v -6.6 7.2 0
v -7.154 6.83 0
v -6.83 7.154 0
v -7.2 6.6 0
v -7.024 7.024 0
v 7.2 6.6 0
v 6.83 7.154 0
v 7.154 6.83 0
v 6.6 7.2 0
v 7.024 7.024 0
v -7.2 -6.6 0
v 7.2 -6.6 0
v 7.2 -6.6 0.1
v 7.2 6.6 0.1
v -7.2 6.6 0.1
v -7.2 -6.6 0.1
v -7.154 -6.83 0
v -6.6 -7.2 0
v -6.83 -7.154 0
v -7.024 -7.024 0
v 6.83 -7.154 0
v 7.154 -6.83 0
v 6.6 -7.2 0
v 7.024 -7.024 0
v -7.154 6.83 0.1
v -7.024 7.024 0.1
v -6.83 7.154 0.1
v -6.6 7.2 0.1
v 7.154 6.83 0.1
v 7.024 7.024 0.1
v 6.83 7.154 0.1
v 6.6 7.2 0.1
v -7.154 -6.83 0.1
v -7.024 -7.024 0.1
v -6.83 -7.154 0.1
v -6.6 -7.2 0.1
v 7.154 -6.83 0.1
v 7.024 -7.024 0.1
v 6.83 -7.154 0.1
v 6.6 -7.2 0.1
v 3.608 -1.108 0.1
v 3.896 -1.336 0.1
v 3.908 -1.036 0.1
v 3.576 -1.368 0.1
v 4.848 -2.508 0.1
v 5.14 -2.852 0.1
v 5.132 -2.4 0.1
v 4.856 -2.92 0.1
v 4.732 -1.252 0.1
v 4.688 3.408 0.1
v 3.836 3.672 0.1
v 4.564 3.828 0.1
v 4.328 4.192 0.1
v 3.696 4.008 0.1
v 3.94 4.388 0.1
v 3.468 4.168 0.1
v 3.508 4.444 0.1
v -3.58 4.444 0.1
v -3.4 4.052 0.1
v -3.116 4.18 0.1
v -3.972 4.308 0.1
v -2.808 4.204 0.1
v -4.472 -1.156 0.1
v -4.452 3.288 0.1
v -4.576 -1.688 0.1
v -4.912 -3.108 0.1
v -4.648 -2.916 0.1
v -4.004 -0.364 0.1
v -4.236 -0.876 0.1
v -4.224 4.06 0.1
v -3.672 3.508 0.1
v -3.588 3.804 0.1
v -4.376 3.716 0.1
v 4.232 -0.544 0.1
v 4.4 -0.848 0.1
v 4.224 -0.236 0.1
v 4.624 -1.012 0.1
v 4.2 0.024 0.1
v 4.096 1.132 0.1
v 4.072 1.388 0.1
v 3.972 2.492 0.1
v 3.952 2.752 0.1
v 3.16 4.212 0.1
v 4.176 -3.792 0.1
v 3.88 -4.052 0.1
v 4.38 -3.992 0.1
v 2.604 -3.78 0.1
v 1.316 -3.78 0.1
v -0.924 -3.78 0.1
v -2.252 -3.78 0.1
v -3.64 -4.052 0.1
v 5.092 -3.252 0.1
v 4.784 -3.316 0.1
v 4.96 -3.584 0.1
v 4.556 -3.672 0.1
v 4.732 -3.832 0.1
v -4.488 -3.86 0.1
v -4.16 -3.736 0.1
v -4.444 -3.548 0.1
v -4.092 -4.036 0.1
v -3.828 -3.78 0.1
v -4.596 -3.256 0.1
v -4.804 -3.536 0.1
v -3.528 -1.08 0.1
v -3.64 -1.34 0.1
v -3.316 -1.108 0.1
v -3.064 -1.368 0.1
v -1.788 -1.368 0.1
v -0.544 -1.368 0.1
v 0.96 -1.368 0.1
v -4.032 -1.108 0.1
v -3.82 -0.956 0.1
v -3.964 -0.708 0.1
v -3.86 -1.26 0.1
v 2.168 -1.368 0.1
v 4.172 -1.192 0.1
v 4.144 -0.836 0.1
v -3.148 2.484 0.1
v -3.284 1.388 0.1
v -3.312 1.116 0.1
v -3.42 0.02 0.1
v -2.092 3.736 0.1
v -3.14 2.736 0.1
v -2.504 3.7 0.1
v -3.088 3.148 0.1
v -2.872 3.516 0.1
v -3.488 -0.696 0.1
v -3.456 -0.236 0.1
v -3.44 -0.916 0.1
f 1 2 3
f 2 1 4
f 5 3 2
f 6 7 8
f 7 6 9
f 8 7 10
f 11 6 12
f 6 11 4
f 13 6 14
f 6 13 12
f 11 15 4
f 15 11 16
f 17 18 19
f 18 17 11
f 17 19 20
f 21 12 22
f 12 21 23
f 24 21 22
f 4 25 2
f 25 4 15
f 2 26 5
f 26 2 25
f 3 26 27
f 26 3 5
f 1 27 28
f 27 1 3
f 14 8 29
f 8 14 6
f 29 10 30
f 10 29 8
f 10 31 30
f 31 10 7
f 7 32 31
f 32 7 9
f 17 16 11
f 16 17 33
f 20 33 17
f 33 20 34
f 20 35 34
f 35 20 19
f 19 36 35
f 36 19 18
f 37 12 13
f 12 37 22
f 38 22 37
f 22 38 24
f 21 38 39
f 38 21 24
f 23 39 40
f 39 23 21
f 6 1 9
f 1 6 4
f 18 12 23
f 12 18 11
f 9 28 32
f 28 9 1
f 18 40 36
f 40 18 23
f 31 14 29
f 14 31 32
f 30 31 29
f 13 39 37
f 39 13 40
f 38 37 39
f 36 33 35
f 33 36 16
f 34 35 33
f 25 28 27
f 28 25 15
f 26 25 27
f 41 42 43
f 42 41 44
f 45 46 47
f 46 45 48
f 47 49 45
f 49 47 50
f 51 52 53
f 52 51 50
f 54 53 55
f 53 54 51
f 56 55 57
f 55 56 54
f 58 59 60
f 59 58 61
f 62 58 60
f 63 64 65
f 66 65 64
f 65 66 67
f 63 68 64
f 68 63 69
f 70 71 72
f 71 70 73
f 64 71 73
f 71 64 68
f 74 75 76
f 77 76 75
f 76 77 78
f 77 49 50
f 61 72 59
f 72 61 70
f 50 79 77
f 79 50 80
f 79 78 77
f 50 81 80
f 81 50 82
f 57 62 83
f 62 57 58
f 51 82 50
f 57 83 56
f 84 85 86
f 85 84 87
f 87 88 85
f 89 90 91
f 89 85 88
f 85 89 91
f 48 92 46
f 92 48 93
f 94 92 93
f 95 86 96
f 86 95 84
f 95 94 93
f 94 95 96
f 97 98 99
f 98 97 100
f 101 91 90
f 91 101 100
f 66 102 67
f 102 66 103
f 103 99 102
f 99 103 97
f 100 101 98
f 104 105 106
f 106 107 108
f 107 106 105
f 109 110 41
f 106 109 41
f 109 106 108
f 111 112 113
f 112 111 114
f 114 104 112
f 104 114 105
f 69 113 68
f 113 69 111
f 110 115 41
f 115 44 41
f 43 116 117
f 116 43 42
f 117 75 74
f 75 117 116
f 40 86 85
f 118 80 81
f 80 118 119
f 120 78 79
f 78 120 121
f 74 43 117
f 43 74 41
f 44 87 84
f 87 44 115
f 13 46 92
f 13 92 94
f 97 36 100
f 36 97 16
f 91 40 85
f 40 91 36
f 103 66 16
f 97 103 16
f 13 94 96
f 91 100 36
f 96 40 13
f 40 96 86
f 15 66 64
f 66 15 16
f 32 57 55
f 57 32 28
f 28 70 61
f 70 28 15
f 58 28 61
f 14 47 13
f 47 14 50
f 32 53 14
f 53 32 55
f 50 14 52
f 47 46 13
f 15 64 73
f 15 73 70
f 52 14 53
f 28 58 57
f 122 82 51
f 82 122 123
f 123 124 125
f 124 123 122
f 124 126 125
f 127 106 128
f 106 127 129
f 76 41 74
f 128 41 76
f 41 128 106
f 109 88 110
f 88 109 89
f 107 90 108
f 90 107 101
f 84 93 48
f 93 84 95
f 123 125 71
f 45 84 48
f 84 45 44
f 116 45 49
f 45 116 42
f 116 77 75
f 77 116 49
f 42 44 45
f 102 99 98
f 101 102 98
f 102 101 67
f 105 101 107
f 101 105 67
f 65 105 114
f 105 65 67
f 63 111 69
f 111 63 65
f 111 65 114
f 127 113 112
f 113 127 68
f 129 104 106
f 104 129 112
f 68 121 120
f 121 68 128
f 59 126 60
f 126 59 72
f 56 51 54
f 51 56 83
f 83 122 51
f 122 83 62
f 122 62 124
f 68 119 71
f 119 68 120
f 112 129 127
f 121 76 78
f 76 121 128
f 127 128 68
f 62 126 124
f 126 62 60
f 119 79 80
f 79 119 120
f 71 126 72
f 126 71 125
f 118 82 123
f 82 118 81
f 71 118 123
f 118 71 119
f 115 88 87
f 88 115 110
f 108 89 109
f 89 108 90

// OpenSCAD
// file: ../p/box3u12.scad
use <../lib.scad>
function ldraw_lib__box3u12() = [
// 0 Box with 3 Parallel Faces without Any Edges
// 0 Name: box3u12.dat
// 0 Author: J.C. Tchang [tchang]
// 0 !LDRAW_ORG Primitive UPDATE 2014-02
// 0 !LICENSE Licensed under CC BY 4.0 : see CAreadme.txt
// 
// 0 BFC CERTIFY CCW
  [0,"BFC","CERTIFY"],
  [0,"BFC","CCW"],
// 
// 0 !HISTORY 2014-12-23 [PTadmin] Official Update 2014-02
// 
// 
// 4 16 -1 1 1 1 1 1 1 1 -1 -1 1 -1
  [4,16,-1,1,1,1,1,1,1,1,-1,-1,1,-1],
// 4 16 -1 1 1 -1 0 1 1 0 1 1 1 1
  [4,16,-1,1,1,-1,0,1,1,0,1,1,1,1],
// 4 16 1 1 -1 1 0 -1 -1 0 -1 -1 1 -1
  [4,16,1,1,-1,1,0,-1,-1,0,-1,-1,1,-1],
];
module ldraw_lib__box3u12(step=0, col=false, unit=2/5, alt=false, line=0.2, solid=!$preview)
    makepoly(ldraw_lib__box3u12(), step=step, col=col, unit=unit, alt=alt, line=line, solid=solid);
ldraw_lib__box3u12(line=0.2);
// file: ../p/1-4cyli.scad
use <../lib.scad>
function ldraw_lib__1_4cyli() = [
// 0 Cylinder 0.25
// 0 Name: 1-4cyli.dat
// 0 Author: James Jessiman
// 0 !LDRAW_ORG Primitive UPDATE 2012-01
// 0 !LICENSE Licensed under CC BY 4.0 : see CAreadme.txt
// 
// 0 BFC CERTIFY CCW
  [0,"BFC","CERTIFY"],
  [0,"BFC","CCW"],
// 
// 0 !HISTORY 2002-03-23 [sbliss] Added BFC statement.
// 0 !HISTORY 2002-04-25 [PTadmin] Official Update 2002-02
// 0 !HISTORY 2007-06-22 [PTadmin] Header formatted for Contributor Agreement
// 0 !HISTORY 2008-07-01 [PTadmin] Official Update 2008-01
// 0 !HISTORY 2012-02-16 [Philo] Changed to CCW
// 0 !HISTORY 2012-03-30 [PTadmin] Official Update 2012-01
// 
// 
// 4 16 1 1 0 0.9239 1 0.3827 0.9239 0 0.3827 1 0 0
  [4,16,1,1,0,0.9239,1,0.3827,0.9239,0,0.3827,1,0,0],
// 5 24 1 0 0 1 1 0 0.9239 0 0.3827 1 0 -1
  [5,24,1,0,0,1,1,0,0.9239,0,0.3827,1,0,-1],
// 4 16 0.9239 1 0.3827 0.7071 1 0.7071 0.7071 0 0.7071 0.9239 0 0.3827
  [4,16,0.9239,1,0.3827,0.7071,1,0.7071,0.7071,0,0.7071,0.9239,0,0.3827],
// 5 24 0.9239 0 0.3827 0.9239 1 0.3827 0.7071 0 0.7071 1 0 0
  [5,24,0.9239,0,0.3827,0.9239,1,0.3827,0.7071,0,0.7071,1,0,0],
// 4 16 0.7071 1 0.7071 0.3827 1 0.9239 0.3827 0 0.9239 0.7071 0 0.7071
  [4,16,0.7071,1,0.7071,0.3827,1,0.9239,0.3827,0,0.9239,0.7071,0,0.7071],
// 5 24 0.7071 0 0.7071 0.7071 1 0.7071 0.3827 0 0.9239 0.9239 0 0.3827
  [5,24,0.7071,0,0.7071,0.7071,1,0.7071,0.3827,0,0.9239,0.9239,0,0.3827],
// 4 16 0.3827 1 0.9239 0 1 1 0 0 1 0.3827 0 0.9239
  [4,16,0.3827,1,0.9239,0,1,1,0,0,1,0.3827,0,0.9239],
// 5 24 0.3827 0 0.9239 0.3827 1 0.9239 0 0 1 0.7071 0 0.7071
  [5,24,0.3827,0,0.9239,0.3827,1,0.9239,0,0,1,0.7071,0,0.7071],
// 5 24 0 0 1 0 1 1 0.3827 0 0.9239 -1 0 1
  [5,24,0,0,1,0,1,1,0.3827,0,0.9239,-1,0,1],
];
module ldraw_lib__1_4cyli(step=0, col=false, unit=2/5, alt=false, line=0.2, solid=!$preview)
    makepoly(ldraw_lib__1_4cyli(), step=step, col=col, unit=unit, alt=alt, line=line, solid=solid);
ldraw_lib__1_4cyli(line=0.2);
// file: s/stickerback018x018.scad
use <../../lib.scad>
use <../../p/1-4chrd.scad>
use <../../p/1-4cyli.scad>
use <../../p/box3u12.scad>
function ldraw_lib__s__stickerback018x018() = [
// 0 ~Sticker Back  1.8 x  1.8
// 0 Name: s\stickerback018x018.dat
// 0 Author: Massimo Maso [Sirio]
// 0 !LDRAW_ORG Subpart UPDATE 2025-08
// 0 !LICENSE Licensed under CC BY 4.0 : see CAreadme.txt
// 
// 0 BFC CERTIFY CCW
  [0,"BFC","CERTIFY"],
  [0,"BFC","CCW"],
// 
// 0 !HISTORY 2025-08-31 [OrionP] Official Update 2025-08
// 
// 0 // Primitives
// 1 16 -16.5 0 16.5 -1.5 0 0 0 -1 0 0 0 1.5 1-4chrd.dat
  [1,16,-16.5,0,16.5,-1.5,0,0,0,-1,0,0,0,1.5, ldraw_lib__1_4chrd()],
// 1 16 16.5 0 16.5 1.5 0 0 0 -1 0 0 0 1.5 1-4chrd.dat
  [1,16,16.5,0,16.5,1.5,0,0,0,-1,0,0,0,1.5, ldraw_lib__1_4chrd()],
// 1 16 0 -.25 0 0 0 18 0 .25 0 16.5 0 0 box3u12.dat
  [1,16,0,-.25,0,0,0,18,0,.25,0,16.5,0,0, ldraw_lib__box3u12()],
// 1 16 -16.5 0 -16.5 -1.5 0 0 0 -1 0 0 0 -1.5 1-4chrd.dat
  [1,16,-16.5,0,-16.5,-1.5,0,0,0,-1,0,0,0,-1.5, ldraw_lib__1_4chrd()],
// 1 16 16.5 0 -16.5 1.5 0 0 0 -1 0 0 0 -1.5 1-4chrd.dat
  [1,16,16.5,0,-16.5,1.5,0,0,0,-1,0,0,0,-1.5, ldraw_lib__1_4chrd()],
// 1 16 -16.5 -.25 16.5 -1.5 0 0 0 .25 0 0 0 1.5 1-4cyli.dat
  [1,16,-16.5,-.25,16.5,-1.5,0,0,0,.25,0,0,0,1.5, ldraw_lib__1_4cyli()],
// 1 16 16.5 -.25 16.5 1.5 0 0 0 .25 0 0 0 1.5 1-4cyli.dat
  [1,16,16.5,-.25,16.5,1.5,0,0,0,.25,0,0,0,1.5, ldraw_lib__1_4cyli()],
// 1 16 -16.5 -.25 -16.5 -1.5 0 0 0 .25 0 0 0 -1.5 1-4cyli.dat
  [1,16,-16.5,-.25,-16.5,-1.5,0,0,0,.25,0,0,0,-1.5, ldraw_lib__1_4cyli()],
// 1 16 16.5 -.25 -16.5 1.5 0 0 0 .25 0 0 0 -1.5 1-4cyli.dat
  [1,16,16.5,-.25,-16.5,1.5,0,0,0,.25,0,0,0,-1.5, ldraw_lib__1_4cyli()],
// 0 // Bottom face
// 4 16 -16.5 0 18 16.5 0 18 18 0 16.5 -18 0 16.5
  [4,16,-16.5,0,18,16.5,0,18,18,0,16.5,-18,0,16.5],
// 4 16 -16.5 0 -18 -18 0 -16.5 18 0 -16.5 16.5 0 -18
  [4,16,-16.5,0,-18,-18,0,-16.5,18,0,-16.5,16.5,0,-18],
// 0 // Lateral face
// 4 16 -16.5 -.25 18 16.5 -.25 18 16.5 0 18 -16.5 0 18
  [4,16,-16.5,-.25,18,16.5,-.25,18,16.5,0,18,-16.5,0,18],
// 4 16 16.5 0 -18 16.5 -.25 -18 -16.5 -.25 -18 -16.5 0 -18
  [4,16,16.5,0,-18,16.5,-.25,-18,-16.5,-.25,-18,-16.5,0,-18],
];
module ldraw_lib__s__stickerback018x018(step=0, col=false, unit=2/5, alt=false, line=0.2, solid=!$preview)
    makepoly(ldraw_lib__s__stickerback018x018(), step=step, col=col, unit=unit, alt=alt, line=line, solid=solid);
ldraw_lib__s__stickerback018x018(line=0.2);
// file: ../p/1-4chrd.scad
use <../lib.scad>
function ldraw_lib__1_4chrd() = [
// 0 Chord 0.25
// 0 Name: 1-4chrd.dat
// 0 Author: Max Martin Richter [MMR1988]
// 0 !LDRAW_ORG Primitive UPDATE 2023-05
// 0 !LICENSE Licensed under CC BY 4.0 : see CAreadme.txt
// 
// 0 BFC CERTIFY CCW
  [0,"BFC","CERTIFY"],
  [0,"BFC","CCW"],
// 
// 0 !HISTORY 2004-04-22 [PTadmin] Official Update 2004-02
// 0 !HISTORY 2007-10-09 [PTadmin] Header formatted for Contributor Agreement
// 0 !HISTORY 2008-07-01 [PTadmin] Official Update 2008-01
// 0 !HISTORY 2012-08-02 [MMR1988] Re-creation with PrimGen2 and Rectifier
// 0 !HISTORY 2012-08-09 [PTadmin] Official Update 2012-02
// 0 !HISTORY 2023-10-27 [OrionP] Change author to MMR1988 from hafhead
// 0 !HISTORY 2023-10-31 [OrionP] Official Update 2023-05
// 
// 4 16 0.9239 0 0.3827 0.3827 0 0.9239 0 0 1 1 0 0
  [4,16,0.9239,0,0.3827,0.3827,0,0.9239,0,0,1,1,0,0],
// 3 16 0.7071 0 0.7071 0.3827 0 0.9239 0.9239 0 0.3827
  [3,16,0.7071,0,0.7071,0.3827,0,0.9239,0.9239,0,0.3827],
];
module ldraw_lib__1_4chrd(step=0, col=false, unit=2/5, alt=false, line=0.2, solid=!$preview)
    makepoly(ldraw_lib__1_4chrd(), step=step, col=col, unit=unit, alt=alt, line=line, solid=solid);
ldraw_lib__1_4chrd(line=0.2);
// main file
use <../lib.scad>
use <../p/1-4chrd.scad>
use <s/stickerback018x018.scad>
function ldraw_lib__6531941a() = [
// 0 Sticker  1.8 x  1.8 with Narrow Shuttle Bay
// 0 Name: 6531941a.dat
// 0 Author: Philippe Hurbain [Philo]
// 0 !LDRAW_ORG Part UPDATE 2026-07
// 0 !LICENSE Licensed under CC BY 4.0 : see CAreadme.txt
// 
// 0 BFC CERTIFY CCW
  [0,"BFC","CERTIFY"],
  [0,"BFC","CCW"],
// 
// 0 !CATEGORY Sticker
// 0 !KEYWORDS Bricklink 10356stk01a, Brickowl 985574, Rebrickable 10111843
// 0 !KEYWORDS Set 10356, Star Trek, U.S.S. Enterprise NCC-1701-D
// 
// 0 !HISTORY 2026-07-30 [OrionP] Official Update 2026-07
// 
// 1 16 0 0 0 1 0 0 0 1 0 0 0 1 s\stickerback018x018.dat
  [1,16,0,0,0,1,0,0,0,1,0,0,0,1, ldraw_lib__s__stickerback018x018()],
// 1 71 16.5 -.25 16.5 1.5 0 0 0 1 0 0 0 1.5 1-4chrd.dat
  [1,71,16.5,-.25,16.5,1.5,0,0,0,1,0,0,0,1.5, ldraw_lib__1_4chrd()],
// 1 71 16.5 -.25 -16.5 0 0 1.5 0 1 0 -1.5 0 0 1-4chrd.dat
  [1,71,16.5,-.25,-16.5,0,0,1.5,0,1,0,-1.5,0,0, ldraw_lib__1_4chrd()],
// 1 71 -16.5 -.25 -16.5 -1.5 0 0 0 1 0 0 0 -1.5 1-4chrd.dat
  [1,71,-16.5,-.25,-16.5,-1.5,0,0,0,1,0,0,0,-1.5, ldraw_lib__1_4chrd()],
// 1 71 -16.5 -.25 16.5 0 0 -1.5 0 1 0 1.5 0 0 1-4chrd.dat
  [1,71,-16.5,-.25,16.5,0,0,-1.5,0,1,0,1.5,0,0, ldraw_lib__1_4chrd()],
// 
// 4 0 8.94 -.25 -3.42 9.74 -.25 -3.34 9.77 -.25 -2.59 9.02 -.25 -2.77
  [4,0,8.94,-.25,-3.42,9.74,-.25,-3.34,9.77,-.25,-2.59,9.02,-.25,-2.77],
// 4 0 12.14 -.25 -7.3 12.85 -.25 -7.13 12.83 -.25 -6 12.12 -.25 -6.27
  [4,0,12.14,-.25,-7.3,12.85,-.25,-7.13,12.83,-.25,-6,12.12,-.25,-6.27],
// 4 0 12.12 -.25 -6.27 12.83 -.25 -6 11.72 -.25 8.52 11.83 -.25 -3.13
  [4,0,12.12,-.25,-6.27,12.83,-.25,-6,11.72,-.25,8.52,11.83,-.25,-3.13],
// 4 0 10.82 -.25 10.48 9.59 -.25 9.18 11.72 -.25 8.52 11.41 -.25 9.57
  [4,0,10.82,-.25,10.48,9.59,-.25,9.18,11.72,-.25,8.52,11.41,-.25,9.57],
// 4 0 9.59 -.25 9.18 10.82 -.25 10.48 9.85 -.25 10.97 9.24 -.25 10.02
  [4,0,9.59,-.25,9.18,10.82,-.25,10.48,9.85,-.25,10.97,9.24,-.25,10.02],
// 4 0 8.77 -.25 11.11 8.67 -.25 10.42 9.24 -.25 10.02 9.85 -.25 10.97
  [4,0,8.77,-.25,11.11,8.67,-.25,10.42,9.24,-.25,10.02,9.85,-.25,10.97],
// 4 0 -7.79 -.25 10.45 -8.95 -.25 11.11 -9.93 -.25 10.77 -8.5 -.25 10.13
  [4,0,-7.79,-.25,10.45,-8.95,-.25,11.11,-9.93,-.25,10.77,-8.5,-.25,10.13],
// 3 0 -7.02 -.25 10.51 -8.95 -.25 11.11 -7.79 -.25 10.45
  [3,0,-7.02,-.25,10.51,-8.95,-.25,11.11,-7.79,-.25,10.45],
// 3 0 -11.18 -.25 -2.89 -11.13 -.25 8.22 -11.44 -.25 -4.22
  [3,0,-11.18,-.25,-2.89,-11.13,-.25,8.22,-11.44,-.25,-4.22],
// 4 0 -11.13 -.25 8.22 -12.28 -.25 -7.77 -11.62 -.25 -7.29 -11.44 -.25 -4.22
  [4,0,-11.13,-.25,8.22,-12.28,-.25,-7.77,-11.62,-.25,-7.29,-11.44,-.25,-4.22],
// 4 0 -11.13 -.25 8.22 -11.18 -.25 -2.89 -10.59 -.25 -2.19 -10.01 -.25 -.91
  [4,0,-11.13,-.25,8.22,-11.18,-.25,-2.89,-10.59,-.25,-2.19,-10.01,-.25,-.91],
// 4 0 -10.94 -.25 9.29 -9.18 -.25 8.77 -8.97 -.25 9.51 -10.56 -.25 10.15
  [4,0,-10.94,-.25,9.29,-9.18,-.25,8.77,-8.97,-.25,9.51,-10.56,-.25,10.15],
// 4 0 -10.94 -.25 9.29 -11.13 -.25 8.22 -10.01 -.25 -.91 -9.18 -.25 8.77
  [4,0,-10.94,-.25,9.29,-11.13,-.25,8.22,-10.01,-.25,-.91,-9.18,-.25,8.77],
// 3 0 10.58 -.25 -1.36 11 -.25 -2.12 10.56 -.25 -.59
  [3,0,10.58,-.25,-1.36,11,-.25,-2.12,10.56,-.25,-.59],
// 4 0 10.5 -.25 .06 10.56 -.25 -.59 11 -.25 -2.12 11.56 -.25 -2.53
  [4,0,10.5,-.25,.06,10.56,-.25,-.59,11,-.25,-2.12,11.56,-.25,-2.53],
// 3 0 11.56 -.25 -2.53 11.83 -.25 -3.13 11.72 -.25 8.52
  [3,0,11.56,-.25,-2.53,11.83,-.25,-3.13,11.72,-.25,8.52],
// 4 0 -10.56 -.25 10.15 -8.97 -.25 9.51 -8.5 -.25 10.13 -9.93 -.25 10.77
  [4,0,-10.56,-.25,10.15,-8.97,-.25,9.51,-8.5,-.25,10.13,-9.93,-.25,10.77],
// 4 0 10.18 -.25 3.47 10.24 -.25 2.83 11.56 -.25 -2.53 11.72 -.25 8.52
  [4,0,10.18,-.25,3.47,10.24,-.25,2.83,11.56,-.25,-2.53,11.72,-.25,8.52],
// 3 0 10.24 -.25 2.83 10.5 -.25 .06 11.56 -.25 -2.53
  [3,0,10.24,-.25,2.83,10.5,-.25,.06,11.56,-.25,-2.53],
// 4 0 9.88 -.25 6.88 9.93 -.25 6.23 10.18 -.25 3.47 11.72 -.25 8.52
  [4,0,9.88,-.25,6.88,9.93,-.25,6.23,10.18,-.25,3.47,11.72,-.25,8.52],
// 4 0 -8.95 -.25 11.11 -7.02 -.25 10.51 7.9 -.25 10.53 8.77 -.25 11.11
  [4,0,-8.95,-.25,11.11,-7.02,-.25,10.51,7.9,-.25,10.53,8.77,-.25,11.11],
// 3 0 9.59 -.25 9.18 9.88 -.25 6.88 11.72 -.25 8.52
  [3,0,9.59,-.25,9.18,9.88,-.25,6.88,11.72,-.25,8.52],
// 3 0 8.77 -.25 11.11 7.9 -.25 10.53 8.67 -.25 10.42
  [3,0,8.77,-.25,11.11,7.9,-.25,10.53,8.67,-.25,10.42],
// 4 0 10.95 -.25 -9.98 10.44 -.25 -9.48 6.51 -.25 -9.45 9.7 -.25 -10.13
  [4,0,10.95,-.25,-9.98,10.44,-.25,-9.48,6.51,-.25,-9.45,9.7,-.25,-10.13],
// 3 0 6.51 -.25 -9.45 3.29 -.25 -9.45 9.7 -.25 -10.13
  [3,0,6.51,-.25,-9.45,3.29,-.25,-9.45,9.7,-.25,-10.13],
// 3 0 -2.31 -.25 -9.45 -5.63 -.25 -9.45 -9.1 -.25 -10.13
  [3,0,-2.31,-.25,-9.45,-5.63,-.25,-9.45,-9.1,-.25,-10.13],
// 4 0 3.29 -.25 -9.45 -2.31 -.25 -9.45 -9.1 -.25 -10.13 9.7 -.25 -10.13
  [4,0,3.29,-.25,-9.45,-2.31,-.25,-9.45,-9.1,-.25,-10.13,9.7,-.25,-10.13],
// 4 0 12.85 -.25 -7.13 12.14 -.25 -7.3 11.96 -.25 -8.29 12.73 -.25 -8.13
  [4,0,12.85,-.25,-7.13,12.14,-.25,-7.3,11.96,-.25,-8.29,12.73,-.25,-8.13],
// 3 0 12.4 -.25 -8.96 12.73 -.25 -8.13 11.96 -.25 -8.29
  [3,0,12.4,-.25,-8.96,12.73,-.25,-8.13,11.96,-.25,-8.29],
// 4 0 10.44 -.25 -9.48 10.95 -.25 -9.98 11.83 -.25 -9.58 11.39 -.25 -9.18
  [4,0,10.44,-.25,-9.48,10.95,-.25,-9.98,11.83,-.25,-9.58,11.39,-.25,-9.18],
// 4 0 11.96 -.25 -8.29 11.39 -.25 -9.18 11.83 -.25 -9.58 12.4 -.25 -8.96
  [4,0,11.96,-.25,-8.29,11.39,-.25,-9.18,11.83,-.25,-9.58,12.4,-.25,-8.96],
// 4 0 -11.11 -.25 -8.87 -11.22 -.25 -9.65 -10.23 -.25 -10.09 -10.4 -.25 -9.34
  [4,0,-11.11,-.25,-8.87,-11.22,-.25,-9.65,-10.23,-.25,-10.09,-10.4,-.25,-9.34],
// 4 0 -5.63 -.25 -9.45 -9.57 -.25 -9.45 -10.23 -.25 -10.09 -9.1 -.25 -10.13
  [4,0,-5.63,-.25,-9.45,-9.57,-.25,-9.45,-10.23,-.25,-10.09,-9.1,-.25,-10.13],
// 4 0 -12.01 -.25 -8.84 -11.49 -.25 -8.14 -11.62 -.25 -7.29 -12.28 -.25 -7.77
  [4,0,-12.01,-.25,-8.84,-11.49,-.25,-8.14,-11.62,-.25,-7.29,-12.28,-.25,-7.77],
// 4 0 -11.22 -.25 -9.65 -11.11 -.25 -8.87 -11.49 -.25 -8.14 -12.01 -.25 -8.84
  [4,0,-11.22,-.25,-9.65,-11.11,-.25,-8.87,-11.49,-.25,-8.14,-12.01,-.25,-8.84],
// 3 0 -10.23 -.25 -10.09 -9.57 -.25 -9.45 -10.4 -.25 -9.34
  [3,0,-10.23,-.25,-10.09,-9.57,-.25,-9.45,-10.4,-.25,-9.34],
// 3 0 -8.82 -.25 -2.7 -9.1 -.25 -3.35 -8.29 -.25 -2.77
  [3,0,-8.82,-.25,-2.7,-9.1,-.25,-3.35,-8.29,-.25,-2.77],
// 4 0 -9.1 -.25 -3.35 -7.66 -.25 -3.42 -4.47 -.25 -3.42 -8.29 -.25 -2.77
  [4,0,-9.1,-.25,-3.35,-7.66,-.25,-3.42,-4.47,-.25,-3.42,-8.29,-.25,-2.77],
// 3 0 -1.36 -.25 -3.42 2.4 -.25 -3.42 9.02 -.25 -2.77
  [3,0,-1.36,-.25,-3.42,2.4,-.25,-3.42,9.02,-.25,-2.77],
// 4 0 -4.47 -.25 -3.42 -1.36 -.25 -3.42 9.02 -.25 -2.77 -8.29 -.25 -2.77
  [4,0,-4.47,-.25,-3.42,-1.36,-.25,-3.42,9.02,-.25,-2.77,-8.29,-.25,-2.77],
// 4 0 -9.65 -.25 -3.15 -9.55 -.25 -2.39 -9.91 -.25 -1.77 -10.08 -.25 -2.77
  [4,0,-9.65,-.25,-3.15,-9.55,-.25,-2.39,-9.91,-.25,-1.77,-10.08,-.25,-2.77],
// 4 0 -9.1 -.25 -3.35 -8.82 -.25 -2.7 -9.55 -.25 -2.39 -9.65 -.25 -3.15
  [4,0,-9.1,-.25,-3.35,-8.82,-.25,-2.7,-9.55,-.25,-2.39,-9.65,-.25,-3.15],
// 4 0 -10.08 -.25 -2.77 -9.91 -.25 -1.77 -10.01 -.25 -.91 -10.59 -.25 -2.19
  [4,0,-10.08,-.25,-2.77,-9.91,-.25,-1.77,-10.01,-.25,-.91,-10.59,-.25,-2.19],
// 3 0 2.4 -.25 -3.42 5.42 -.25 -3.42 9.02 -.25 -2.77
  [3,0,2.4,-.25,-3.42,5.42,-.25,-3.42,9.02,-.25,-2.77],
// 3 0 5.42 -.25 -3.42 8.94 -.25 -3.42 9.02 -.25 -2.77
  [3,0,5.42,-.25,-3.42,8.94,-.25,-3.42,9.02,-.25,-2.77],
// 4 0 10.36 -.25 -2.09 9.77 -.25 -2.59 9.74 -.25 -3.34 10.43 -.25 -2.98
  [4,0,10.36,-.25,-2.09,9.77,-.25,-2.59,9.74,-.25,-3.34,10.43,-.25,-2.98],
// 4 0 10.58 -.25 -1.36 10.36 -.25 -2.09 10.43 -.25 -2.98 11 -.25 -2.12
  [4,0,10.58,-.25,-1.36,10.36,-.25,-2.09,10.43,-.25,-2.98,11,-.25,-2.12],
// 3 71 16.5 -.25 -18 10.95 -.25 -9.98 9.7 -.25 -10.13
  [3,71,16.5,-.25,-18,10.95,-.25,-9.98,9.7,-.25,-10.13],
// 4 71 -8.21 -.25 3.47 10.18 -.25 3.47 9.93 -.25 6.23 -7.87 -.25 6.21
  [4,71,-8.21,-.25,3.47,10.18,-.25,3.47,9.93,-.25,6.23,-7.87,-.25,6.21],
// 4 71 -8.55 -.25 .05 10.5 -.25 .06 10.24 -.25 2.83 -8.28 -.25 2.79
  [4,71,-8.55,-.25,.05,10.5,-.25,.06,10.24,-.25,2.83,-8.28,-.25,2.79],
// 4 71 9.02 -.25 -2.77 9.77 -.25 -2.59 10.36 -.25 -2.09 10.58 -.25 -1.36
  [4,71,9.02,-.25,-2.77,9.77,-.25,-2.59,10.36,-.25,-2.09,10.58,-.25,-1.36],
// 4 71 10.44 -.25 -9.48 8.94 -.25 -3.42 5.42 -.25 -3.42 6.51 -.25 -9.45
  [4,71,10.44,-.25,-9.48,8.94,-.25,-3.42,5.42,-.25,-3.42,6.51,-.25,-9.45],
// 3 71 18 -.25 -16.5 12.85 -.25 -7.13 12.73 -.25 -8.13
  [3,71,18,-.25,-16.5,12.85,-.25,-7.13,12.73,-.25,-8.13],
// 3 71 18 -.25 -16.5 12.73 -.25 -8.13 12.4 -.25 -8.96
  [3,71,18,-.25,-16.5,12.73,-.25,-8.13,12.4,-.25,-8.96],
// 4 71 -10.23 -.25 -10.09 -11.22 -.25 -9.65 -18 -.25 -16.5 -16.5 -.25 -18
  [4,71,-10.23,-.25,-10.09,-11.22,-.25,-9.65,-18,-.25,-16.5,-16.5,-.25,-18],
// 4 71 9.7 -.25 -10.13 -9.1 -.25 -10.13 -16.5 -.25 -18 16.5 -.25 -18
  [4,71,9.7,-.25,-10.13,-9.1,-.25,-10.13,-16.5,-.25,-18,16.5,-.25,-18],
// 3 71 -12.01 -.25 -8.84 -12.28 -.25 -7.77 -18 -.25 -16.5
  [3,71,-12.01,-.25,-8.84,-12.28,-.25,-7.77,-18,-.25,-16.5],
// 3 71 -11.22 -.25 -9.65 -12.01 -.25 -8.84 -18 -.25 -16.5
  [3,71,-11.22,-.25,-9.65,-12.01,-.25,-8.84,-18,-.25,-16.5],
// 3 71 18 -.25 -16.5 12.4 -.25 -8.96 11.83 -.25 -9.58
  [3,71,18,-.25,-16.5,12.4,-.25,-8.96,11.83,-.25,-9.58],
// 3 71 -9.1 -.25 -10.13 -10.23 -.25 -10.09 -16.5 -.25 -18
  [3,71,-9.1,-.25,-10.13,-10.23,-.25,-10.09,-16.5,-.25,-18],
// 4 71 18 -.25 -16.5 11.83 -.25 -9.58 10.95 -.25 -9.98 16.5 -.25 -18
  [4,71,18,-.25,-16.5,11.83,-.25,-9.58,10.95,-.25,-9.98,16.5,-.25,-18],
// 4 71 -11.13 -.25 8.22 -18 -.25 16.5 -18 -.25 -16.5 -12.28 -.25 -7.77
  [4,71,-11.13,-.25,8.22,-18,-.25,16.5,-18,-.25,-16.5,-12.28,-.25,-7.77],
// 4 71 9.85 -.25 10.97 16.5 -.25 18 -16.5 -.25 18 8.77 -.25 11.11
  [4,71,9.85,-.25,10.97,16.5,-.25,18,-16.5,-.25,18,8.77,-.25,11.11],
// 4 71 -9.93 -.25 10.77 -16.5 -.25 18 -18 -.25 16.5 -10.56 -.25 10.15
  [4,71,-9.93,-.25,10.77,-16.5,-.25,18,-18,-.25,16.5,-10.56,-.25,10.15],
// 3 71 -8.95 -.25 11.11 -16.5 -.25 18 -9.93 -.25 10.77
  [3,71,-8.95,-.25,11.11,-16.5,-.25,18,-9.93,-.25,10.77],
// 4 71 11.72 -.25 8.52 12.83 -.25 -6 18 -.25 -16.5 18 -.25 16.5
  [4,71,11.72,-.25,8.52,12.83,-.25,-6,18,-.25,-16.5,18,-.25,16.5],
// 4 71 9.85 -.25 10.97 10.82 -.25 10.48 18 -.25 16.5 16.5 -.25 18
  [4,71,9.85,-.25,10.97,10.82,-.25,10.48,18,-.25,16.5,16.5,-.25,18],
// 3 71 11.72 -.25 8.52 18 -.25 16.5 11.41 -.25 9.57
  [3,71,11.72,-.25,8.52,18,-.25,16.5,11.41,-.25,9.57],
// 3 71 12.83 -.25 -6 12.85 -.25 -7.13 18 -.25 -16.5
  [3,71,12.83,-.25,-6,12.85,-.25,-7.13,18,-.25,-16.5],
// 3 71 -18 -.25 16.5 -11.13 -.25 8.22 -10.94 -.25 9.29
  [3,71,-18,-.25,16.5,-11.13,-.25,8.22,-10.94,-.25,9.29],
// 3 71 -18 -.25 16.5 -10.94 -.25 9.29 -10.56 -.25 10.15
  [3,71,-18,-.25,16.5,-10.94,-.25,9.29,-10.56,-.25,10.15],
// 3 71 11.41 -.25 9.57 18 -.25 16.5 10.82 -.25 10.48
  [3,71,11.41,-.25,9.57,18,-.25,16.5,10.82,-.25,10.48],
// 3 71 -16.5 -.25 18 -8.95 -.25 11.11 8.77 -.25 11.11
  [3,71,-16.5,-.25,18,-8.95,-.25,11.11,8.77,-.25,11.11],
// 4 71 -7.85 -.25 6.84 9.88 -.25 6.88 9.59 -.25 9.18 -5.23 -.25 9.34
  [4,71,-7.85,-.25,6.84,9.88,-.25,6.88,9.59,-.25,9.18,-5.23,-.25,9.34],
// 4 71 -7.72 -.25 7.87 -7.85 -.25 6.84 -5.23 -.25 9.34 -6.26 -.25 9.25
  [4,71,-7.72,-.25,7.87,-7.85,-.25,6.84,-5.23,-.25,9.34,-6.26,-.25,9.25],
// 3 71 -6.26 -.25 9.25 -7.18 -.25 8.79 -7.72 -.25 7.87
  [3,71,-6.26,-.25,9.25,-7.18,-.25,8.79,-7.72,-.25,7.87],
// 4 71 -8.6 -.25 -2.29 -8.29 -.25 -2.77 -8.64 -.25 -.59 -8.72 -.25 -1.74
  [4,71,-8.6,-.25,-2.29,-8.29,-.25,-2.77,-8.64,-.25,-.59,-8.72,-.25,-1.74],
// 3 71 10.56 -.25 -.59 9.02 -.25 -2.77 10.58 -.25 -1.36
  [3,71,10.56,-.25,-.59,9.02,-.25,-2.77,10.58,-.25,-1.36],
// 4 71 10.56 -.25 -.59 -8.64 -.25 -.59 -8.29 -.25 -2.77 9.02 -.25 -2.77
  [4,71,10.56,-.25,-.59,-8.64,-.25,-.59,-8.29,-.25,-2.77,9.02,-.25,-2.77],
// 4 71 2.4 -.25 -3.42 -1.36 -.25 -3.42 -2.31 -.25 -9.45 3.29 -.25 -9.45
  [4,71,2.4,-.25,-3.42,-1.36,-.25,-3.42,-2.31,-.25,-9.45,3.29,-.25,-9.45],
// 4 71 -4.47 -.25 -3.42 -7.66 -.25 -3.42 -9.57 -.25 -9.45 -5.63 -.25 -9.45
  [4,71,-4.47,-.25,-3.42,-7.66,-.25,-3.42,-9.57,-.25,-9.45,-5.63,-.25,-9.45],
// 4 72 12.14 -.25 -7.3 10.44 -.25 -9.48 11.39 -.25 -9.18 11.96 -.25 -8.29
  [4,72,12.14,-.25,-7.3,10.44,-.25,-9.48,11.39,-.25,-9.18,11.96,-.25,-8.29],
// 3 72 -7.85 -.25 6.84 -7.72 -.25 7.87 -9.18 -.25 8.77
  [3,72,-7.85,-.25,6.84,-7.72,-.25,7.87,-9.18,-.25,8.77],
// 4 72 8.94 -.25 -3.42 10.44 -.25 -9.48 12.14 -.25 -7.3 12.12 -.25 -6.27
  [4,72,8.94,-.25,-3.42,10.44,-.25,-9.48,12.14,-.25,-7.3,12.12,-.25,-6.27],
// 4 72 9.74 -.25 -3.34 12.12 -.25 -6.27 11.83 -.25 -3.13 10.43 -.25 -2.98
  [4,72,9.74,-.25,-3.34,12.12,-.25,-6.27,11.83,-.25,-3.13,10.43,-.25,-2.98],
// 4 72 11 -.25 -2.12 10.43 -.25 -2.98 11.83 -.25 -3.13 11.56 -.25 -2.53
  [4,72,11,-.25,-2.12,10.43,-.25,-2.98,11.83,-.25,-3.13,11.56,-.25,-2.53],
// 3 72 9.74 -.25 -3.34 8.94 -.25 -3.42 12.12 -.25 -6.27
  [3,72,9.74,-.25,-3.34,8.94,-.25,-3.42,12.12,-.25,-6.27],
// 3 72 -11.49 -.25 -8.14 -11.11 -.25 -8.87 -10.4 -.25 -9.34
  [3,72,-11.49,-.25,-8.14,-11.11,-.25,-8.87,-10.4,-.25,-9.34],
// 4 72 -11.62 -.25 -7.29 -11.49 -.25 -8.14 -10.4 -.25 -9.34 -9.57 -.25 -9.45
  [4,72,-11.62,-.25,-7.29,-11.49,-.25,-8.14,-10.4,-.25,-9.34,-9.57,-.25,-9.45],
// 4 72 -11.62 -.25 -7.29 -9.57 -.25 -9.45 -7.66 -.25 -3.42 -9.1 -.25 -3.35
  [4,72,-11.62,-.25,-7.29,-9.57,-.25,-9.45,-7.66,-.25,-3.42,-9.1,-.25,-3.35],
// 4 72 -9.65 -.25 -3.15 -11.44 -.25 -4.22 -11.62 -.25 -7.29 -9.1 -.25 -3.35
  [4,72,-9.65,-.25,-3.15,-11.44,-.25,-4.22,-11.62,-.25,-7.29,-9.1,-.25,-3.35],
// 4 72 -10.59 -.25 -2.19 -11.18 -.25 -2.89 -11.44 -.25 -4.22 -10.08 -.25 -2.77
  [4,72,-10.59,-.25,-2.19,-11.18,-.25,-2.89,-11.44,-.25,-4.22,-10.08,-.25,-2.77],
// 3 72 -10.08 -.25 -2.77 -11.44 -.25 -4.22 -9.65 -.25 -3.15
  [3,72,-10.08,-.25,-2.77,-11.44,-.25,-4.22,-9.65,-.25,-3.15],
// 4 72 -10.01 -.25 -.91 -9.91 -.25 -1.77 -9.55 -.25 -2.39 -8.72 -.25 -1.74
  [4,72,-10.01,-.25,-.91,-9.91,-.25,-1.77,-9.55,-.25,-2.39,-8.72,-.25,-1.74],
// 4 72 -8.29 -.25 -2.77 -8.6 -.25 -2.29 -9.55 -.25 -2.39 -8.82 -.25 -2.7
  [4,72,-8.29,-.25,-2.77,-8.6,-.25,-2.29,-9.55,-.25,-2.39,-8.82,-.25,-2.7],
// 4 72 -8.64 -.25 -.59 -8.55 -.25 .05 -8.28 -.25 2.79 -10.01 -.25 -.91
  [4,72,-8.64,-.25,-.59,-8.55,-.25,.05,-8.28,-.25,2.79,-10.01,-.25,-.91],
// 4 72 -8.97 -.25 9.51 -7.18 -.25 8.79 -7.79 -.25 10.45 -8.5 -.25 10.13
  [4,72,-8.97,-.25,9.51,-7.18,-.25,8.79,-7.79,-.25,10.45,-8.5,-.25,10.13],
// 4 72 7.9 -.25 10.53 9.59 -.25 9.18 9.24 -.25 10.02 8.67 -.25 10.42
  [4,72,7.9,-.25,10.53,9.59,-.25,9.18,9.24,-.25,10.02,8.67,-.25,10.42],
// 4 72 -7.02 -.25 10.51 -5.23 -.25 9.34 9.59 -.25 9.18 7.9 -.25 10.53
  [4,72,-7.02,-.25,10.51,-5.23,-.25,9.34,9.59,-.25,9.18,7.9,-.25,10.53],
// 3 72 -5.23 -.25 9.34 -7.02 -.25 10.51 -6.26 -.25 9.25
  [3,72,-5.23,-.25,9.34,-7.02,-.25,10.51,-6.26,-.25,9.25],
// 4 72 -9.18 -.25 8.77 -10.01 -.25 -.91 -8.28 -.25 2.79 -8.21 -.25 3.47
  [4,72,-9.18,-.25,8.77,-10.01,-.25,-.91,-8.28,-.25,2.79,-8.21,-.25,3.47],
// 3 72 -9.55 -.25 -2.39 -8.6 -.25 -2.29 -8.72 -.25 -1.74
  [3,72,-9.55,-.25,-2.39,-8.6,-.25,-2.29,-8.72,-.25,-1.74],
// 4 72 10.5 -.25 .06 -8.55 -.25 .05 -8.64 -.25 -.59 10.56 -.25 -.59
  [4,72,10.5,-.25,.06,-8.55,-.25,.05,-8.64,-.25,-.59,10.56,-.25,-.59],
// 3 72 -8.72 -.25 -1.74 -8.64 -.25 -.59 -10.01 -.25 -.91
  [3,72,-8.72,-.25,-1.74,-8.64,-.25,-.59,-10.01,-.25,-.91],
// 4 72 -7.79 -.25 10.45 -7.18 -.25 8.79 -6.26 -.25 9.25 -7.02 -.25 10.51
  [4,72,-7.79,-.25,10.45,-7.18,-.25,8.79,-6.26,-.25,9.25,-7.02,-.25,10.51],
// 4 72 10.18 -.25 3.47 -8.21 -.25 3.47 -8.28 -.25 2.79 10.24 -.25 2.83
  [4,72,10.18,-.25,3.47,-8.21,-.25,3.47,-8.28,-.25,2.79,10.24,-.25,2.83],
// 4 72 -8.97 -.25 9.51 -9.18 -.25 8.77 -7.72 -.25 7.87 -7.18 -.25 8.79
  [4,72,-8.97,-.25,9.51,-9.18,-.25,8.77,-7.72,-.25,7.87,-7.18,-.25,8.79],
// 4 72 9.93 -.25 6.23 9.88 -.25 6.88 -7.85 -.25 6.84 -7.87 -.25 6.21
  [4,72,9.93,-.25,6.23,9.88,-.25,6.88,-7.85,-.25,6.84,-7.87,-.25,6.21],
// 4 72 -8.21 -.25 3.47 -7.87 -.25 6.21 -7.85 -.25 6.84 -9.18 -.25 8.77
  [4,72,-8.21,-.25,3.47,-7.87,-.25,6.21,-7.85,-.25,6.84,-9.18,-.25,8.77],
// 4 484 2.4 -.25 -3.42 3.29 -.25 -9.45 6.51 -.25 -9.45 5.42 -.25 -3.42
  [4,484,2.4,-.25,-3.42,3.29,-.25,-9.45,6.51,-.25,-9.45,5.42,-.25,-3.42],
// 4 484 -1.36 -.25 -3.42 -4.47 -.25 -3.42 -5.63 -.25 -9.45 -2.31 -.25 -9.45
  [4,484,-1.36,-.25,-3.42,-4.47,-.25,-3.42,-5.63,-.25,-9.45,-2.31,-.25,-9.45],
];
module ldraw_lib__6531941a(step=0, col=false, unit=2/5, alt=false, line=0.2, solid=!$preview)
    makepoly(ldraw_lib__6531941a(), step=step, col=col, unit=unit, alt=alt, line=line, solid=solid);
ldraw_lib__6531941a(line=0.2);
